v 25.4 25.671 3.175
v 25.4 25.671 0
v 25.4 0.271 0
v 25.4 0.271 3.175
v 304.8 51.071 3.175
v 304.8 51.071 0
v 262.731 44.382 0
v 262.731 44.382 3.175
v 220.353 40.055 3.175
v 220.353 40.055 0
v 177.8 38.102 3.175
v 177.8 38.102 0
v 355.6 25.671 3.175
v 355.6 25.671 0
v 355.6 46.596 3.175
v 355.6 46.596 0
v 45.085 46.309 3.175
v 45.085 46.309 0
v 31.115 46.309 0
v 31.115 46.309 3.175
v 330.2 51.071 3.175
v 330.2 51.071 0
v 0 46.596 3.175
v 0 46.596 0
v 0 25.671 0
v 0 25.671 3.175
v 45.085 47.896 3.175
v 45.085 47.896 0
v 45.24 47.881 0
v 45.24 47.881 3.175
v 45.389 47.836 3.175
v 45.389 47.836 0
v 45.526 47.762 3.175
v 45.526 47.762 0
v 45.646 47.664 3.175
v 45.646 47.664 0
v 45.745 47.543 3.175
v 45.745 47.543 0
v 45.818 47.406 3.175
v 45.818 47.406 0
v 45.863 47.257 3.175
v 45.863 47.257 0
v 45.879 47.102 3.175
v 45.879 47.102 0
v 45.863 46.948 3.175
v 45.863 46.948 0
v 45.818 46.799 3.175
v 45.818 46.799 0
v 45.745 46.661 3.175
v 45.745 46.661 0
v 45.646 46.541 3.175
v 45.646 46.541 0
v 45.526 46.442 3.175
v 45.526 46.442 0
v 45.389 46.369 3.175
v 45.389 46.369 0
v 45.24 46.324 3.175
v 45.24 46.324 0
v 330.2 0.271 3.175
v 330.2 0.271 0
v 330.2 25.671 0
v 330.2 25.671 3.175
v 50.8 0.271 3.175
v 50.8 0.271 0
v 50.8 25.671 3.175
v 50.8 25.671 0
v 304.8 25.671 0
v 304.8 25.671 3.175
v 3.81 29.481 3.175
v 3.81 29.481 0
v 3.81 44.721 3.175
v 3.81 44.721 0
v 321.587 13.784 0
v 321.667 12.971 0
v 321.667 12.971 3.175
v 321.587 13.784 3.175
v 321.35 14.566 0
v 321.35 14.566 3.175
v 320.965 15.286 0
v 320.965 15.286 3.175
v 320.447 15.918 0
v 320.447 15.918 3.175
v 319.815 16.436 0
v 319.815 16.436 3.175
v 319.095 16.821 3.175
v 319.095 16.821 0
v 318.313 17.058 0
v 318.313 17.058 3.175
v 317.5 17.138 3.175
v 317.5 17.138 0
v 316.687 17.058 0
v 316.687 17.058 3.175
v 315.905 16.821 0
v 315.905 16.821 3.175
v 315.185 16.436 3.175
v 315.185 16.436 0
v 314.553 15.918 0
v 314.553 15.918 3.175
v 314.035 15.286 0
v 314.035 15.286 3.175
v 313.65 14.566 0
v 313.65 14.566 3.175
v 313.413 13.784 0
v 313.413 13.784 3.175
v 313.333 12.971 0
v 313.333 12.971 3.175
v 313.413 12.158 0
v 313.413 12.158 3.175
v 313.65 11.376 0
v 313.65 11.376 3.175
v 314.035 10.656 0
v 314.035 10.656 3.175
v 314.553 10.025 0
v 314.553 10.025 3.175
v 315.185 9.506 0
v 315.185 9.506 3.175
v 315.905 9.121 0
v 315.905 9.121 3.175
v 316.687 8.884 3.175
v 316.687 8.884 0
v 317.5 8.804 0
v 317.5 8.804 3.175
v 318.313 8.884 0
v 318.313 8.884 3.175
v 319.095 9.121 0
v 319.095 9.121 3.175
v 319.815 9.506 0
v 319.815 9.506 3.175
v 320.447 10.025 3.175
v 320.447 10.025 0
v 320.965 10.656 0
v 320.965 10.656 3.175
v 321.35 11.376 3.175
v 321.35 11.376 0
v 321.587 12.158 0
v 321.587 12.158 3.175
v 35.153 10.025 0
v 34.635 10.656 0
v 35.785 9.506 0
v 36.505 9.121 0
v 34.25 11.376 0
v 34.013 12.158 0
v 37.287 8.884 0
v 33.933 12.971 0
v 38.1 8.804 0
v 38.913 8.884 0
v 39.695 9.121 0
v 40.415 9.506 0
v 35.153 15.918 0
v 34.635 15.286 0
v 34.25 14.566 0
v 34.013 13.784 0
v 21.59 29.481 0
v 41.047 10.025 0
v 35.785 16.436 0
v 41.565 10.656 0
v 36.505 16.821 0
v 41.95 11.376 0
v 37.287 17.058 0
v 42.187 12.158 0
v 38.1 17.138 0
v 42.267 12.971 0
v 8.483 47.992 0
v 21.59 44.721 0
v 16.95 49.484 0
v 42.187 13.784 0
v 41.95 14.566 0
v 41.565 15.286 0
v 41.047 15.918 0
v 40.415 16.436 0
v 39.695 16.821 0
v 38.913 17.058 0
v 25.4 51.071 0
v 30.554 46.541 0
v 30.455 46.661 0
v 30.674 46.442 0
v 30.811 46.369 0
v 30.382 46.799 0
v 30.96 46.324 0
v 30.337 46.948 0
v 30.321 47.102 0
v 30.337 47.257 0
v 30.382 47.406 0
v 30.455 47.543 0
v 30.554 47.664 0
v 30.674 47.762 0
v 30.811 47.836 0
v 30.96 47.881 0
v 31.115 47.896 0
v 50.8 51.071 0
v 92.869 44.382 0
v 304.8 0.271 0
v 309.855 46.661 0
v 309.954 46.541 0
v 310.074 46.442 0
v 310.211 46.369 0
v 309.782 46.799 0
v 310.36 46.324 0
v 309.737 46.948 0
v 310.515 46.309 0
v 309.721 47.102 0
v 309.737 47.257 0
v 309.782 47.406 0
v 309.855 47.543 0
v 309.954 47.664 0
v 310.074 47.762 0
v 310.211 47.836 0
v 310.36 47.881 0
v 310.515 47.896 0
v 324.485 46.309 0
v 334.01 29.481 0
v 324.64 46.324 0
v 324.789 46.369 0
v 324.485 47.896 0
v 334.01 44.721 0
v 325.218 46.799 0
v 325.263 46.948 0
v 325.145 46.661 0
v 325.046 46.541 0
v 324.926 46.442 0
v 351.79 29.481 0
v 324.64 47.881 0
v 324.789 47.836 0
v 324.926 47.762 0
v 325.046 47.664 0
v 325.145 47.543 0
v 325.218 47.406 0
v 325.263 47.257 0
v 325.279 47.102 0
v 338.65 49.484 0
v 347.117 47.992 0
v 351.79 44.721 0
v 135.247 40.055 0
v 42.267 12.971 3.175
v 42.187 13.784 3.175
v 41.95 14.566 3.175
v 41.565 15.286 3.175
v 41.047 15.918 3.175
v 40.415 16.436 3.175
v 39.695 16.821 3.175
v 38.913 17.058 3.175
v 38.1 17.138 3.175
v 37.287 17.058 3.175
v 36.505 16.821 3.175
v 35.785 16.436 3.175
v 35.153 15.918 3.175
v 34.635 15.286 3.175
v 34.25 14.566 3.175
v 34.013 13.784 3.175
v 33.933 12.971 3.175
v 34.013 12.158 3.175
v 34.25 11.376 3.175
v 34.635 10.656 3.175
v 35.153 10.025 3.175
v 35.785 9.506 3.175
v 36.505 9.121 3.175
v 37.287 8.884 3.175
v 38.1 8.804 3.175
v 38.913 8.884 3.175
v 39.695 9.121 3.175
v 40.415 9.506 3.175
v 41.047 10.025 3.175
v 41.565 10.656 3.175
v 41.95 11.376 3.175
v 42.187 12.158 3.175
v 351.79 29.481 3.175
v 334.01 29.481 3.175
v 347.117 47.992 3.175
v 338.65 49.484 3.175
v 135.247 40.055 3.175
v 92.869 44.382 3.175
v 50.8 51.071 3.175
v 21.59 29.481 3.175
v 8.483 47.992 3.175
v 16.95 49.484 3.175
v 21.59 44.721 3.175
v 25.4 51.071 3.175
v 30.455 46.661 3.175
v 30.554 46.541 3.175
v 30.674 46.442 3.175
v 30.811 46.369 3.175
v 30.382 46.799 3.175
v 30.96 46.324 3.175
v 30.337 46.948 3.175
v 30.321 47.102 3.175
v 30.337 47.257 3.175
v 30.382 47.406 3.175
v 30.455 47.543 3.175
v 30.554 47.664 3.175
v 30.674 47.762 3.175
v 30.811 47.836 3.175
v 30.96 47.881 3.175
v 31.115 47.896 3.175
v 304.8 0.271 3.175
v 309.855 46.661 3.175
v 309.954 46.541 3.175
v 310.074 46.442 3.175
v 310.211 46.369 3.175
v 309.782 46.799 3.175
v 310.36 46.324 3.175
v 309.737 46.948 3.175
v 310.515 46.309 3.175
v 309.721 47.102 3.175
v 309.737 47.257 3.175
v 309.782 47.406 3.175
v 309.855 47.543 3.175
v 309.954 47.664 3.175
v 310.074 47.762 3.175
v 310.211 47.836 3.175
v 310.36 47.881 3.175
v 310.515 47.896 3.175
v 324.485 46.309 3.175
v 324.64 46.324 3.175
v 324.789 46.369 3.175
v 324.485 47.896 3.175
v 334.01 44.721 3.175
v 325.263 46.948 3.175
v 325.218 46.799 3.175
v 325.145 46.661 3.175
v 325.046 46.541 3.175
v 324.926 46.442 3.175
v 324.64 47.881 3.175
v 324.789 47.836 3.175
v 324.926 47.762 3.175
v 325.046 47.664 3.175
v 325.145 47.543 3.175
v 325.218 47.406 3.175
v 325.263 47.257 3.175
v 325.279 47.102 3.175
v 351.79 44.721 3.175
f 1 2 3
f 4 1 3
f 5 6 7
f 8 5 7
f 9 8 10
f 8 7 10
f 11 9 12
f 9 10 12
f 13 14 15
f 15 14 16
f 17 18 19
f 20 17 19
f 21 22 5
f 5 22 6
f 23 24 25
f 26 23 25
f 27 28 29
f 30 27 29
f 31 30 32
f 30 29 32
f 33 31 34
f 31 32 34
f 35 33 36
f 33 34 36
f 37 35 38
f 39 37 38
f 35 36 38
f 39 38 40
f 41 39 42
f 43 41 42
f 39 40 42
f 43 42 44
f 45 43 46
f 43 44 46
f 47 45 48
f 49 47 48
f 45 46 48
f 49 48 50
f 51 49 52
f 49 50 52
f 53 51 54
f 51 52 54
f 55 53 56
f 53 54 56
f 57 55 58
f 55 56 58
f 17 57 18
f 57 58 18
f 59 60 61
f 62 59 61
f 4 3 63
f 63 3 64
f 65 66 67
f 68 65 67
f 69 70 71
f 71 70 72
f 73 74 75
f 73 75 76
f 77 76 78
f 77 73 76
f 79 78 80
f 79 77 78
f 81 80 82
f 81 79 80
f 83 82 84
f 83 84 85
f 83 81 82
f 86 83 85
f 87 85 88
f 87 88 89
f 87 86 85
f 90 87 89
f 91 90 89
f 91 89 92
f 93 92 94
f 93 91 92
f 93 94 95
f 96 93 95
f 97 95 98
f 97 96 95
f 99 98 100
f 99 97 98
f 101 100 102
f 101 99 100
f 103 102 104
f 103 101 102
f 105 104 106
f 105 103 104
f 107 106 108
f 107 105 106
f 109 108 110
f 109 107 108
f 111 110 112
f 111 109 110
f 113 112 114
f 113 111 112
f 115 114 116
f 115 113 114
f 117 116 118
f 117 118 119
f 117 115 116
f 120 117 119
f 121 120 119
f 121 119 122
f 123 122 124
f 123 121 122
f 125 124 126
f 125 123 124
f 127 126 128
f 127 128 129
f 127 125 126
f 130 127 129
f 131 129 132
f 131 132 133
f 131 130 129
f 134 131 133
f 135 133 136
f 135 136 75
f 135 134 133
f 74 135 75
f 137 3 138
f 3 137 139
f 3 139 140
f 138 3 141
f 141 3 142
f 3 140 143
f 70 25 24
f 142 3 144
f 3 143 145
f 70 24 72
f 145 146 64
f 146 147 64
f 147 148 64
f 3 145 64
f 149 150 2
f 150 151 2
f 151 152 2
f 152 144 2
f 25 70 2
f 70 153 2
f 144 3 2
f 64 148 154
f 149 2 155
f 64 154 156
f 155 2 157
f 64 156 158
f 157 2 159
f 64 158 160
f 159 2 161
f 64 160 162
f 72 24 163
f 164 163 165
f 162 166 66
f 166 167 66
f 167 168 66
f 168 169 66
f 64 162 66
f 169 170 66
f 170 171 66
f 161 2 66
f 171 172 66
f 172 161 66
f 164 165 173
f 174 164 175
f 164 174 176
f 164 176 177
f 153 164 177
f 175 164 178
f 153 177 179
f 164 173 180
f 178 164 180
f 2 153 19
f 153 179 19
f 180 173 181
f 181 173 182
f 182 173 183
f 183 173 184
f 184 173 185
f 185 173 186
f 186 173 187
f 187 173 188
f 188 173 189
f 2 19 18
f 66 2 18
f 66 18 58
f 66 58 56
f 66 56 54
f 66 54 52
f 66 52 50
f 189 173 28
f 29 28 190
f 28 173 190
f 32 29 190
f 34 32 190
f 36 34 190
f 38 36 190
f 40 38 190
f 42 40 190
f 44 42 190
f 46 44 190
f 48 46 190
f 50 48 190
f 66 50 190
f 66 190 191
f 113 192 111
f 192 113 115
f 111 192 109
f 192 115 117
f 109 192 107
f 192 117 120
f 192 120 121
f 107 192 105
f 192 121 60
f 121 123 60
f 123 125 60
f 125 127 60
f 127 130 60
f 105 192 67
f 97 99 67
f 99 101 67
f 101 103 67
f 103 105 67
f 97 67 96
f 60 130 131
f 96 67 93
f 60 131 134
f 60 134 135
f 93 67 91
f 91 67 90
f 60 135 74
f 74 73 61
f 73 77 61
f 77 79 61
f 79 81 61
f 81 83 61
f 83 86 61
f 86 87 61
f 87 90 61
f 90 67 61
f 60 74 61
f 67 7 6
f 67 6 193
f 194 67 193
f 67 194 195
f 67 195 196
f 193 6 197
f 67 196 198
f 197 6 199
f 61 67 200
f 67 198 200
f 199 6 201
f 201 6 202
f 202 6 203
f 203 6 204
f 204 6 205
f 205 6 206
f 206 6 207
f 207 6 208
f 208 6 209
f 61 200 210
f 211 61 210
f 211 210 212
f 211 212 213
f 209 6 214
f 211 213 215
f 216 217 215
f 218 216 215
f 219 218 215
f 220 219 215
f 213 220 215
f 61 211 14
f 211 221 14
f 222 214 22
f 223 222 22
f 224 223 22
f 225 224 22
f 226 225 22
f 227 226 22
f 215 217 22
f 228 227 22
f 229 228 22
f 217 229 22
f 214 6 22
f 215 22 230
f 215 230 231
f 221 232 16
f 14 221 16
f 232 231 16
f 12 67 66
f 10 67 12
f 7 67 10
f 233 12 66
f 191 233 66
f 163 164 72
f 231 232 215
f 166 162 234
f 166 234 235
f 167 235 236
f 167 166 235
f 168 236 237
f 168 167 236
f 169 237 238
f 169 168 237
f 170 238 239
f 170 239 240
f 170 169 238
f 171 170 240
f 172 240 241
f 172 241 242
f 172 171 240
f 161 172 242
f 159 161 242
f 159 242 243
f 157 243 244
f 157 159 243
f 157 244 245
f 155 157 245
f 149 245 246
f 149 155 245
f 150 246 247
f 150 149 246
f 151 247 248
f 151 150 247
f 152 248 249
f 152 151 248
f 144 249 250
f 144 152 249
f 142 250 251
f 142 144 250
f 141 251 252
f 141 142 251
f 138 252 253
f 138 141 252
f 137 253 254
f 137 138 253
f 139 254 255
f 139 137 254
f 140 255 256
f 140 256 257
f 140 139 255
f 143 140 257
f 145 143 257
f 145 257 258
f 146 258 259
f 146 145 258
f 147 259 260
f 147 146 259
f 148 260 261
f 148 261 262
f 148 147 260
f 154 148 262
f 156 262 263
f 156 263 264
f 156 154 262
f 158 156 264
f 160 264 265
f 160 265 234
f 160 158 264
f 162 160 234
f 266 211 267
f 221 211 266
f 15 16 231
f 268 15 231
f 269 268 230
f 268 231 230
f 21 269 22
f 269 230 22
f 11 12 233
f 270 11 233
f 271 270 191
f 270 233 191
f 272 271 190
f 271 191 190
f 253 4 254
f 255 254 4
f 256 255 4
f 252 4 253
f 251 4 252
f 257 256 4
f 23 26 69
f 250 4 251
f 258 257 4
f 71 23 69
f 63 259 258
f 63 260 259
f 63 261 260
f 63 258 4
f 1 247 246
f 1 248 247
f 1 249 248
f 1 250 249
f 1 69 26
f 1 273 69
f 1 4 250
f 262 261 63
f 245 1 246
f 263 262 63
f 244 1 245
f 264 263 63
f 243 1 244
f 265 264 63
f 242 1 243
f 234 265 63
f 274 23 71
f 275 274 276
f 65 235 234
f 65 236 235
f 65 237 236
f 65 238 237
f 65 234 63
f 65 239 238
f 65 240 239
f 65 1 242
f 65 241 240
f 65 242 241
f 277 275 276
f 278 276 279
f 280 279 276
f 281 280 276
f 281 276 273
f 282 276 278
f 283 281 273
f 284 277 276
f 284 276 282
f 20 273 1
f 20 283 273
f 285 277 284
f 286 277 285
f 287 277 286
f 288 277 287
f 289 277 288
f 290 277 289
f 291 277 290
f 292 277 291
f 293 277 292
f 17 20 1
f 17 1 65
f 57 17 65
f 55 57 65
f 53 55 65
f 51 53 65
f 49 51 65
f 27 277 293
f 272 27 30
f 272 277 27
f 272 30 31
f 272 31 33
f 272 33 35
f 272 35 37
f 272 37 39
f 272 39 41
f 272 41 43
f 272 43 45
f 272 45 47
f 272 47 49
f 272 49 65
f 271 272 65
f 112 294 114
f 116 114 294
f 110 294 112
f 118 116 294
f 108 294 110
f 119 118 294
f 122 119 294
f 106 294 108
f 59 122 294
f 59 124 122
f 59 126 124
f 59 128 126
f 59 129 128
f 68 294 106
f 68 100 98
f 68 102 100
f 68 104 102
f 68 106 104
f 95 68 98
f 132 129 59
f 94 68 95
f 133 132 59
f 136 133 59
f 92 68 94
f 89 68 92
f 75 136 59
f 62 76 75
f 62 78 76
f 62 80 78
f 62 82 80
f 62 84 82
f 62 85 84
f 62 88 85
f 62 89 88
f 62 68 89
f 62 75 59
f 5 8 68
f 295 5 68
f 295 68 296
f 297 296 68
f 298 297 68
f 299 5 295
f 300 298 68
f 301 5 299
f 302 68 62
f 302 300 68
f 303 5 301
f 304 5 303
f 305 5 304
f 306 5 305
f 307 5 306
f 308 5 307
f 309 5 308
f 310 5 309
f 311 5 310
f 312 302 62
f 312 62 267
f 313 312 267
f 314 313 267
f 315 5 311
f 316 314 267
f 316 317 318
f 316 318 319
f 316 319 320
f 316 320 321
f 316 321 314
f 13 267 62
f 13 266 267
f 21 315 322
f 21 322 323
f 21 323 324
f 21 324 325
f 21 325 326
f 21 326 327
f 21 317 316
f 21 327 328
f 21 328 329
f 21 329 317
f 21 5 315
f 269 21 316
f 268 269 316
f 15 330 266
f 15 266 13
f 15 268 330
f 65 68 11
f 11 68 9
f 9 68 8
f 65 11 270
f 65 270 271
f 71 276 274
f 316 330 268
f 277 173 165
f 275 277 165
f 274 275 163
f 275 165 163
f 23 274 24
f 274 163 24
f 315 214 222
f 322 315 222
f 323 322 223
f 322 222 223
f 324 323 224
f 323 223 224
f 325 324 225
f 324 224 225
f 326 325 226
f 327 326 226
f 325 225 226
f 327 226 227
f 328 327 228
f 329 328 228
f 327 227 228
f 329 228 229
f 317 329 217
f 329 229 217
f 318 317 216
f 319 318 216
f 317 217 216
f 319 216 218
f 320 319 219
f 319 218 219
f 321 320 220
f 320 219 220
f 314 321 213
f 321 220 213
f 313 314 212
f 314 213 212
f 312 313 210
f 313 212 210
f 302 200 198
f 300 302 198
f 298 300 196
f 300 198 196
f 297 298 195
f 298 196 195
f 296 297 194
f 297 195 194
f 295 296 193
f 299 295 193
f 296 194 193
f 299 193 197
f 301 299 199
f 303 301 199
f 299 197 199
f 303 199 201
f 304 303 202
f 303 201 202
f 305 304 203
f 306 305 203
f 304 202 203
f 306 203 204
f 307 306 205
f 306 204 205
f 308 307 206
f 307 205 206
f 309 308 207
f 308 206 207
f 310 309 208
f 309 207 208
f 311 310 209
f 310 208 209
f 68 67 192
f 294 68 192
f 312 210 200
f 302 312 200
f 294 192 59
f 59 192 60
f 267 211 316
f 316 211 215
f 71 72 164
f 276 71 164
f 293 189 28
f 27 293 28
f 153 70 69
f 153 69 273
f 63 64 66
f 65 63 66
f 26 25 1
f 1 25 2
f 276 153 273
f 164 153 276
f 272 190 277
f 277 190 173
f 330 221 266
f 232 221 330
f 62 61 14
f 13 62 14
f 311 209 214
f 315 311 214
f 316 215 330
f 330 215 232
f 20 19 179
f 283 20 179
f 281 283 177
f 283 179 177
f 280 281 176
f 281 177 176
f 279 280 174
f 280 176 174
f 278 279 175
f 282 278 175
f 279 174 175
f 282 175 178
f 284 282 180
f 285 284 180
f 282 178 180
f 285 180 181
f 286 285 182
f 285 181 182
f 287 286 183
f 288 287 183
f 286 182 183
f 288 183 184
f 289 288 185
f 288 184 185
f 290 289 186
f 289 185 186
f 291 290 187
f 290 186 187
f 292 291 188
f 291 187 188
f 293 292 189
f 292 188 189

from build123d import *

# Parameters (mm, degrees)
F0_R     = 4.167188
F0_W     = 17.78
F0_H     = 15.24
F1_DEPTH = 3.175


with BuildPart() as f1:
    # F0 (on Top) → F1 (new body)
    with BuildSketch(Plane.XY):
        with BuildLine():
            Line((25.4, 25.671175), (25.4, 0.271175))
            Line((25.4, 0.271175), (50.8, 0.271175))
            Line((50.8, 0.271175), (50.8, 25.671175))
            Line((50.8, 25.671175), (177.8, 25.671175))
            Line((177.8, 25.671175), (304.8, 25.671175))
            Line((304.8, 25.671175), (304.8, 0.271175))
            Line((304.8, 0.271175), (330.2, 0.271175))
            Line((330.2, 0.271175), (330.2, 25.671175))
            Line((330.2, 25.671175), (355.6, 25.671175))
            Line((355.6, 25.671175), (355.6, 46.595866))
            ThreePointArc((355.6, 46.595866), (342.881064, 48.726049), (330.2, 51.071175))
            Line((330.2, 51.071175), (304.8, 51.071175))
            ThreePointArc((304.8, 51.071175), (241.572069, 41.922444), (177.8, 38.102263))
            ThreePointArc((177.8, 38.102263), (114.027931, 41.922444), (50.8, 51.071175))
            Line((50.8, 51.071175), (25.4, 51.071175))
            ThreePointArc((25.4, 51.071175), (12.718936, 48.726049), (0, 46.595866))
            Line((0, 46.595866), (0, 25.671175))
            Line((0, 25.671175), (25.4, 25.671175))
        make_face()
        with Locations((38.1, 12.971175)):
            Circle(F0_R, mode=Mode.SUBTRACT)
        with Locations((317.5, 12.971175)):
            Circle(F0_R, mode=Mode.SUBTRACT)
        with Locations((12.7, 37.101175)):
            Rectangle(F0_W, F0_H, mode=Mode.SUBTRACT)
        with BuildLine():
            ThreePointArc((31.115, 46.308675), (30.32125, 47.102425), (31.115, 47.896175))
            Line((31.115, 47.896175), (45.085, 47.896175))
            ThreePointArc((45.085, 47.896175), (45.87875, 47.102425), (45.085, 46.308675))
            Line((45.085, 46.308675), (31.115, 46.308675))
        make_face(mode=Mode.SUBTRACT)
        with Locations((342.9, 37.101175)):
            Rectangle(F0_W, F0_H, mode=Mode.SUBTRACT)
        with BuildLine():
            Line((310.515, 47.896175), (324.485, 47.896175))
            ThreePointArc((324.485, 47.896175), (325.27875, 47.102425), (324.485, 46.308675))
            Line((324.485, 46.308675), (310.515, 46.308675))
            ThreePointArc((310.515, 46.308675), (309.72125, 47.102425), (310.515, 47.896175))
        make_face(mode=Mode.SUBTRACT)
    extrude(amount=F1_DEPTH)


solid = f1.part
